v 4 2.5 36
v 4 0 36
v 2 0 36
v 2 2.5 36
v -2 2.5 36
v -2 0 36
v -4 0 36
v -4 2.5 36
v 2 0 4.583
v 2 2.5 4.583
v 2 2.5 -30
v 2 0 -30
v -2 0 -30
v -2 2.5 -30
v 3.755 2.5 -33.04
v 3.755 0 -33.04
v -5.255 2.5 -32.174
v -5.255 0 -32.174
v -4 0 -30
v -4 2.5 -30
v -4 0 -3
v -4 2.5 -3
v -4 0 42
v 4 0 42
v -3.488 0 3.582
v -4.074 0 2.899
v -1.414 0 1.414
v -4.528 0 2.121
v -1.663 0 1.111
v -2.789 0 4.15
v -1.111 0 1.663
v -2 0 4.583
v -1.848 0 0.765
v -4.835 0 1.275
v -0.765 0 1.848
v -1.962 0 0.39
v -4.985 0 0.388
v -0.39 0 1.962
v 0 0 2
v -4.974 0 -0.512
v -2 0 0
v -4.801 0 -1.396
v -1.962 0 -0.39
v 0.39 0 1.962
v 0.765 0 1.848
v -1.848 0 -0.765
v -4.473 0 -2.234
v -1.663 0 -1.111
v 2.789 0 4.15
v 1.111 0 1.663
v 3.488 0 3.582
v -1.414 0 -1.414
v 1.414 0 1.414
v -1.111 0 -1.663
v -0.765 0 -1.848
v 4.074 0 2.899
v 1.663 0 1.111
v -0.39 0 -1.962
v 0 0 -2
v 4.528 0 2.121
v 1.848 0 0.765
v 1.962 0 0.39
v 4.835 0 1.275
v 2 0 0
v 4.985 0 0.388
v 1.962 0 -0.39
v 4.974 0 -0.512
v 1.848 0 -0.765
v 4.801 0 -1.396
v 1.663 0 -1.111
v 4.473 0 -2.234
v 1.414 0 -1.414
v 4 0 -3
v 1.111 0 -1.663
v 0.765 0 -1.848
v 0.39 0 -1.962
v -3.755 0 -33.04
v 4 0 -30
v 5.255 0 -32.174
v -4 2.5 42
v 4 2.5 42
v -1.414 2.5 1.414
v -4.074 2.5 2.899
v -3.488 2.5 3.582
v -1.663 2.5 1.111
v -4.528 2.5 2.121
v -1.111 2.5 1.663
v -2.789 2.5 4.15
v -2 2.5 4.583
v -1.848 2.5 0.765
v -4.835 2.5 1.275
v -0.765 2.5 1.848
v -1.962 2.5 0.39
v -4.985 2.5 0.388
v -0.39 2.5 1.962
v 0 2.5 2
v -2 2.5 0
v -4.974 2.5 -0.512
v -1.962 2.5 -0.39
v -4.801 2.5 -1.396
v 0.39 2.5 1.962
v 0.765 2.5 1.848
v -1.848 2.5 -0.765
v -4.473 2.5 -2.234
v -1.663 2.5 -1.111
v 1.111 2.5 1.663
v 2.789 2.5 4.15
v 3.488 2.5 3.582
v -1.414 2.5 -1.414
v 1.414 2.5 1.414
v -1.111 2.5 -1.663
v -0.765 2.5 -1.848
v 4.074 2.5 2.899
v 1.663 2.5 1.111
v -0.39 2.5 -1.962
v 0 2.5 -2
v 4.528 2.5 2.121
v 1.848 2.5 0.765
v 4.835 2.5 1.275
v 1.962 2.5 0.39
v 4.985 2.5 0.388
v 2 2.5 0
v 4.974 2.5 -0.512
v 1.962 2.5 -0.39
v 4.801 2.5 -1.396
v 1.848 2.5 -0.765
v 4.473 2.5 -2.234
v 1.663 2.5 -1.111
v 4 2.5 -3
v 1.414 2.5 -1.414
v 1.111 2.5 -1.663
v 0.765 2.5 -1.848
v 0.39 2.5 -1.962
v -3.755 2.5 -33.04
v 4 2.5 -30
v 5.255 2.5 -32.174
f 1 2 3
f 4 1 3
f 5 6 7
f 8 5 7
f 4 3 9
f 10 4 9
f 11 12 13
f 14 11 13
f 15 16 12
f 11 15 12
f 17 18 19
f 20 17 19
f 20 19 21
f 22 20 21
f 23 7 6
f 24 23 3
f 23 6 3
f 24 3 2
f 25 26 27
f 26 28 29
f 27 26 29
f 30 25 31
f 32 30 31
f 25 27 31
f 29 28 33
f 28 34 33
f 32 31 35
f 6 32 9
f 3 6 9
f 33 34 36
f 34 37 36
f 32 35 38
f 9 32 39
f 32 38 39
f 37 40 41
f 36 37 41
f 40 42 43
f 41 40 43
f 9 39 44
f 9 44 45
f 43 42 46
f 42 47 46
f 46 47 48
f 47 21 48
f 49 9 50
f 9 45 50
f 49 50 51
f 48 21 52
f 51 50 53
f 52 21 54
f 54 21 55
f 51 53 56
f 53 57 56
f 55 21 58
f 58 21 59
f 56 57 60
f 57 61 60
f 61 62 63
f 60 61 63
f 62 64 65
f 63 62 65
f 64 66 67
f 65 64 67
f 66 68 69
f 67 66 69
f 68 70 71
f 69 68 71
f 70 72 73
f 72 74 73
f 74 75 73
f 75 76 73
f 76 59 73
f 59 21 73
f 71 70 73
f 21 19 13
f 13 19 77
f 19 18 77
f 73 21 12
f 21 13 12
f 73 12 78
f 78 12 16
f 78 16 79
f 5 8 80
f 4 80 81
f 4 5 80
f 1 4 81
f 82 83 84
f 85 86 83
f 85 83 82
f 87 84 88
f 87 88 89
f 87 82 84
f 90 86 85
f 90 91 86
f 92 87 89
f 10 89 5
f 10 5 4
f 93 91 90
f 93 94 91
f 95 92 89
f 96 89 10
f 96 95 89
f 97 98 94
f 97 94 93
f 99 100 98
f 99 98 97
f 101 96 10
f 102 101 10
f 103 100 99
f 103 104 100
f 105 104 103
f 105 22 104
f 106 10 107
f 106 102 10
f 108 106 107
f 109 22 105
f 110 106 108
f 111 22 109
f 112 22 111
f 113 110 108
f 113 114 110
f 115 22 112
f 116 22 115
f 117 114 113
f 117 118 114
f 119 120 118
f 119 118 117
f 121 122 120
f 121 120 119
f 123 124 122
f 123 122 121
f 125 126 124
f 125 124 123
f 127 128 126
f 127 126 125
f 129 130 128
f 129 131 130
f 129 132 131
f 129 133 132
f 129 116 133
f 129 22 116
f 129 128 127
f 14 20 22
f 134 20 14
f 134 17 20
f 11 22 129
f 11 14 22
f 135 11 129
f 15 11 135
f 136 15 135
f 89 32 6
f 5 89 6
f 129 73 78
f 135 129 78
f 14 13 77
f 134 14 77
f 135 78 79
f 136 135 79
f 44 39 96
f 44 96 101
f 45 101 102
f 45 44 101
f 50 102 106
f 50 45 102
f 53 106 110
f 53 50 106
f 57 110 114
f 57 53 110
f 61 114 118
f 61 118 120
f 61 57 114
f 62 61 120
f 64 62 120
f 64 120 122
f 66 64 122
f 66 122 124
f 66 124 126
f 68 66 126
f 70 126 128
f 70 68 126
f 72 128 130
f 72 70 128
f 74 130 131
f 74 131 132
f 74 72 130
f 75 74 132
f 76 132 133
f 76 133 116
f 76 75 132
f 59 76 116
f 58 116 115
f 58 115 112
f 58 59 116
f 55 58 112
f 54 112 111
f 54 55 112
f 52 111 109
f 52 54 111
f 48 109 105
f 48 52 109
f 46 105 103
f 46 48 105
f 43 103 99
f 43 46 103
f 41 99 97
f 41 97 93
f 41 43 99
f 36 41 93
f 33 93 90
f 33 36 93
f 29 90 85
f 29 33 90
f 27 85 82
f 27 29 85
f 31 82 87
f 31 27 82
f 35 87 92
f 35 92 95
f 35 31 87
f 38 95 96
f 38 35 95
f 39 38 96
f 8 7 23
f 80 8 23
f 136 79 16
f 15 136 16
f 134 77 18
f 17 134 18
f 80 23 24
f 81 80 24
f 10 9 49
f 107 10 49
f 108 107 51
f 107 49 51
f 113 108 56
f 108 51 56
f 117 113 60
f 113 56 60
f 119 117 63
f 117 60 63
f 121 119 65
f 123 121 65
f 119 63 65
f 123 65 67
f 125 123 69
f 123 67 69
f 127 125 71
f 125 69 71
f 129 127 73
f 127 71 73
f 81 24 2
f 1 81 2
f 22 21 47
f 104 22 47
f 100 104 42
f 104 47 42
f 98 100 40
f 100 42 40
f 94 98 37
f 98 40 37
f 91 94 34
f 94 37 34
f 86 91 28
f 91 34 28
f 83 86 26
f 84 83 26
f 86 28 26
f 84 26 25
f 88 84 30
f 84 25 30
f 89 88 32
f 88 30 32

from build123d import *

# Parameters (mm, degrees)
SKETCH1_R           = 2
BOSS_EXTRUDE1_DEPTH = 2.5


with BuildPart() as part:
    # Sketch1 → Boss-Extrude1 (new body)
    with BuildSketch(Plane(origin=(0, 0, 0), x_dir=(1, 0, 0), z_dir=(0, 1, 0))):
        with BuildLine():
            Line((-2, -4.582575695), (-2, -36))
            Line((-2, -36), (-4, -36))
            Line((-4, -36), (-4, -42))
            Line((-4, -42), (4, -42))
            Line((4, -42), (4, -36))
            Line((4, -36), (2, -36))
            Line((2, -36), (2, -4.582575695))
            ThreePointArc((2, -4.582575695), (4.83465237, -1.275200556), (4, 3))
            Line((4, 3), (4, 30))
            Line((4, 30), (5.25505198, 32.173813795))
            Line((5.25505198, 32.173813795), (3.75505198, 33.039839198))
            Line((3.75505198, 33.039839198), (2, 30))
            Line((2, 30), (-2, 30))
            Line((-2, 30), (-3.75505198, 33.039839198))
            Line((-3.75505198, 33.039839198), (-5.25505198, 32.173813795))
            Line((-5.25505198, 32.173813795), (-4, 30))
            Line((-4, 30), (-4, 3))
            ThreePointArc((-4, 3), (-4.83465237, -1.275200556), (-2, -4.582575695))
        make_face()
        with Locations(Location((0, 0, 0), (0, 0, 270))):
            Circle(SKETCH1_R, mode=Mode.SUBTRACT)
    extrude(amount=BOSS_EXTRUDE1_DEPTH)


solid = part.part
